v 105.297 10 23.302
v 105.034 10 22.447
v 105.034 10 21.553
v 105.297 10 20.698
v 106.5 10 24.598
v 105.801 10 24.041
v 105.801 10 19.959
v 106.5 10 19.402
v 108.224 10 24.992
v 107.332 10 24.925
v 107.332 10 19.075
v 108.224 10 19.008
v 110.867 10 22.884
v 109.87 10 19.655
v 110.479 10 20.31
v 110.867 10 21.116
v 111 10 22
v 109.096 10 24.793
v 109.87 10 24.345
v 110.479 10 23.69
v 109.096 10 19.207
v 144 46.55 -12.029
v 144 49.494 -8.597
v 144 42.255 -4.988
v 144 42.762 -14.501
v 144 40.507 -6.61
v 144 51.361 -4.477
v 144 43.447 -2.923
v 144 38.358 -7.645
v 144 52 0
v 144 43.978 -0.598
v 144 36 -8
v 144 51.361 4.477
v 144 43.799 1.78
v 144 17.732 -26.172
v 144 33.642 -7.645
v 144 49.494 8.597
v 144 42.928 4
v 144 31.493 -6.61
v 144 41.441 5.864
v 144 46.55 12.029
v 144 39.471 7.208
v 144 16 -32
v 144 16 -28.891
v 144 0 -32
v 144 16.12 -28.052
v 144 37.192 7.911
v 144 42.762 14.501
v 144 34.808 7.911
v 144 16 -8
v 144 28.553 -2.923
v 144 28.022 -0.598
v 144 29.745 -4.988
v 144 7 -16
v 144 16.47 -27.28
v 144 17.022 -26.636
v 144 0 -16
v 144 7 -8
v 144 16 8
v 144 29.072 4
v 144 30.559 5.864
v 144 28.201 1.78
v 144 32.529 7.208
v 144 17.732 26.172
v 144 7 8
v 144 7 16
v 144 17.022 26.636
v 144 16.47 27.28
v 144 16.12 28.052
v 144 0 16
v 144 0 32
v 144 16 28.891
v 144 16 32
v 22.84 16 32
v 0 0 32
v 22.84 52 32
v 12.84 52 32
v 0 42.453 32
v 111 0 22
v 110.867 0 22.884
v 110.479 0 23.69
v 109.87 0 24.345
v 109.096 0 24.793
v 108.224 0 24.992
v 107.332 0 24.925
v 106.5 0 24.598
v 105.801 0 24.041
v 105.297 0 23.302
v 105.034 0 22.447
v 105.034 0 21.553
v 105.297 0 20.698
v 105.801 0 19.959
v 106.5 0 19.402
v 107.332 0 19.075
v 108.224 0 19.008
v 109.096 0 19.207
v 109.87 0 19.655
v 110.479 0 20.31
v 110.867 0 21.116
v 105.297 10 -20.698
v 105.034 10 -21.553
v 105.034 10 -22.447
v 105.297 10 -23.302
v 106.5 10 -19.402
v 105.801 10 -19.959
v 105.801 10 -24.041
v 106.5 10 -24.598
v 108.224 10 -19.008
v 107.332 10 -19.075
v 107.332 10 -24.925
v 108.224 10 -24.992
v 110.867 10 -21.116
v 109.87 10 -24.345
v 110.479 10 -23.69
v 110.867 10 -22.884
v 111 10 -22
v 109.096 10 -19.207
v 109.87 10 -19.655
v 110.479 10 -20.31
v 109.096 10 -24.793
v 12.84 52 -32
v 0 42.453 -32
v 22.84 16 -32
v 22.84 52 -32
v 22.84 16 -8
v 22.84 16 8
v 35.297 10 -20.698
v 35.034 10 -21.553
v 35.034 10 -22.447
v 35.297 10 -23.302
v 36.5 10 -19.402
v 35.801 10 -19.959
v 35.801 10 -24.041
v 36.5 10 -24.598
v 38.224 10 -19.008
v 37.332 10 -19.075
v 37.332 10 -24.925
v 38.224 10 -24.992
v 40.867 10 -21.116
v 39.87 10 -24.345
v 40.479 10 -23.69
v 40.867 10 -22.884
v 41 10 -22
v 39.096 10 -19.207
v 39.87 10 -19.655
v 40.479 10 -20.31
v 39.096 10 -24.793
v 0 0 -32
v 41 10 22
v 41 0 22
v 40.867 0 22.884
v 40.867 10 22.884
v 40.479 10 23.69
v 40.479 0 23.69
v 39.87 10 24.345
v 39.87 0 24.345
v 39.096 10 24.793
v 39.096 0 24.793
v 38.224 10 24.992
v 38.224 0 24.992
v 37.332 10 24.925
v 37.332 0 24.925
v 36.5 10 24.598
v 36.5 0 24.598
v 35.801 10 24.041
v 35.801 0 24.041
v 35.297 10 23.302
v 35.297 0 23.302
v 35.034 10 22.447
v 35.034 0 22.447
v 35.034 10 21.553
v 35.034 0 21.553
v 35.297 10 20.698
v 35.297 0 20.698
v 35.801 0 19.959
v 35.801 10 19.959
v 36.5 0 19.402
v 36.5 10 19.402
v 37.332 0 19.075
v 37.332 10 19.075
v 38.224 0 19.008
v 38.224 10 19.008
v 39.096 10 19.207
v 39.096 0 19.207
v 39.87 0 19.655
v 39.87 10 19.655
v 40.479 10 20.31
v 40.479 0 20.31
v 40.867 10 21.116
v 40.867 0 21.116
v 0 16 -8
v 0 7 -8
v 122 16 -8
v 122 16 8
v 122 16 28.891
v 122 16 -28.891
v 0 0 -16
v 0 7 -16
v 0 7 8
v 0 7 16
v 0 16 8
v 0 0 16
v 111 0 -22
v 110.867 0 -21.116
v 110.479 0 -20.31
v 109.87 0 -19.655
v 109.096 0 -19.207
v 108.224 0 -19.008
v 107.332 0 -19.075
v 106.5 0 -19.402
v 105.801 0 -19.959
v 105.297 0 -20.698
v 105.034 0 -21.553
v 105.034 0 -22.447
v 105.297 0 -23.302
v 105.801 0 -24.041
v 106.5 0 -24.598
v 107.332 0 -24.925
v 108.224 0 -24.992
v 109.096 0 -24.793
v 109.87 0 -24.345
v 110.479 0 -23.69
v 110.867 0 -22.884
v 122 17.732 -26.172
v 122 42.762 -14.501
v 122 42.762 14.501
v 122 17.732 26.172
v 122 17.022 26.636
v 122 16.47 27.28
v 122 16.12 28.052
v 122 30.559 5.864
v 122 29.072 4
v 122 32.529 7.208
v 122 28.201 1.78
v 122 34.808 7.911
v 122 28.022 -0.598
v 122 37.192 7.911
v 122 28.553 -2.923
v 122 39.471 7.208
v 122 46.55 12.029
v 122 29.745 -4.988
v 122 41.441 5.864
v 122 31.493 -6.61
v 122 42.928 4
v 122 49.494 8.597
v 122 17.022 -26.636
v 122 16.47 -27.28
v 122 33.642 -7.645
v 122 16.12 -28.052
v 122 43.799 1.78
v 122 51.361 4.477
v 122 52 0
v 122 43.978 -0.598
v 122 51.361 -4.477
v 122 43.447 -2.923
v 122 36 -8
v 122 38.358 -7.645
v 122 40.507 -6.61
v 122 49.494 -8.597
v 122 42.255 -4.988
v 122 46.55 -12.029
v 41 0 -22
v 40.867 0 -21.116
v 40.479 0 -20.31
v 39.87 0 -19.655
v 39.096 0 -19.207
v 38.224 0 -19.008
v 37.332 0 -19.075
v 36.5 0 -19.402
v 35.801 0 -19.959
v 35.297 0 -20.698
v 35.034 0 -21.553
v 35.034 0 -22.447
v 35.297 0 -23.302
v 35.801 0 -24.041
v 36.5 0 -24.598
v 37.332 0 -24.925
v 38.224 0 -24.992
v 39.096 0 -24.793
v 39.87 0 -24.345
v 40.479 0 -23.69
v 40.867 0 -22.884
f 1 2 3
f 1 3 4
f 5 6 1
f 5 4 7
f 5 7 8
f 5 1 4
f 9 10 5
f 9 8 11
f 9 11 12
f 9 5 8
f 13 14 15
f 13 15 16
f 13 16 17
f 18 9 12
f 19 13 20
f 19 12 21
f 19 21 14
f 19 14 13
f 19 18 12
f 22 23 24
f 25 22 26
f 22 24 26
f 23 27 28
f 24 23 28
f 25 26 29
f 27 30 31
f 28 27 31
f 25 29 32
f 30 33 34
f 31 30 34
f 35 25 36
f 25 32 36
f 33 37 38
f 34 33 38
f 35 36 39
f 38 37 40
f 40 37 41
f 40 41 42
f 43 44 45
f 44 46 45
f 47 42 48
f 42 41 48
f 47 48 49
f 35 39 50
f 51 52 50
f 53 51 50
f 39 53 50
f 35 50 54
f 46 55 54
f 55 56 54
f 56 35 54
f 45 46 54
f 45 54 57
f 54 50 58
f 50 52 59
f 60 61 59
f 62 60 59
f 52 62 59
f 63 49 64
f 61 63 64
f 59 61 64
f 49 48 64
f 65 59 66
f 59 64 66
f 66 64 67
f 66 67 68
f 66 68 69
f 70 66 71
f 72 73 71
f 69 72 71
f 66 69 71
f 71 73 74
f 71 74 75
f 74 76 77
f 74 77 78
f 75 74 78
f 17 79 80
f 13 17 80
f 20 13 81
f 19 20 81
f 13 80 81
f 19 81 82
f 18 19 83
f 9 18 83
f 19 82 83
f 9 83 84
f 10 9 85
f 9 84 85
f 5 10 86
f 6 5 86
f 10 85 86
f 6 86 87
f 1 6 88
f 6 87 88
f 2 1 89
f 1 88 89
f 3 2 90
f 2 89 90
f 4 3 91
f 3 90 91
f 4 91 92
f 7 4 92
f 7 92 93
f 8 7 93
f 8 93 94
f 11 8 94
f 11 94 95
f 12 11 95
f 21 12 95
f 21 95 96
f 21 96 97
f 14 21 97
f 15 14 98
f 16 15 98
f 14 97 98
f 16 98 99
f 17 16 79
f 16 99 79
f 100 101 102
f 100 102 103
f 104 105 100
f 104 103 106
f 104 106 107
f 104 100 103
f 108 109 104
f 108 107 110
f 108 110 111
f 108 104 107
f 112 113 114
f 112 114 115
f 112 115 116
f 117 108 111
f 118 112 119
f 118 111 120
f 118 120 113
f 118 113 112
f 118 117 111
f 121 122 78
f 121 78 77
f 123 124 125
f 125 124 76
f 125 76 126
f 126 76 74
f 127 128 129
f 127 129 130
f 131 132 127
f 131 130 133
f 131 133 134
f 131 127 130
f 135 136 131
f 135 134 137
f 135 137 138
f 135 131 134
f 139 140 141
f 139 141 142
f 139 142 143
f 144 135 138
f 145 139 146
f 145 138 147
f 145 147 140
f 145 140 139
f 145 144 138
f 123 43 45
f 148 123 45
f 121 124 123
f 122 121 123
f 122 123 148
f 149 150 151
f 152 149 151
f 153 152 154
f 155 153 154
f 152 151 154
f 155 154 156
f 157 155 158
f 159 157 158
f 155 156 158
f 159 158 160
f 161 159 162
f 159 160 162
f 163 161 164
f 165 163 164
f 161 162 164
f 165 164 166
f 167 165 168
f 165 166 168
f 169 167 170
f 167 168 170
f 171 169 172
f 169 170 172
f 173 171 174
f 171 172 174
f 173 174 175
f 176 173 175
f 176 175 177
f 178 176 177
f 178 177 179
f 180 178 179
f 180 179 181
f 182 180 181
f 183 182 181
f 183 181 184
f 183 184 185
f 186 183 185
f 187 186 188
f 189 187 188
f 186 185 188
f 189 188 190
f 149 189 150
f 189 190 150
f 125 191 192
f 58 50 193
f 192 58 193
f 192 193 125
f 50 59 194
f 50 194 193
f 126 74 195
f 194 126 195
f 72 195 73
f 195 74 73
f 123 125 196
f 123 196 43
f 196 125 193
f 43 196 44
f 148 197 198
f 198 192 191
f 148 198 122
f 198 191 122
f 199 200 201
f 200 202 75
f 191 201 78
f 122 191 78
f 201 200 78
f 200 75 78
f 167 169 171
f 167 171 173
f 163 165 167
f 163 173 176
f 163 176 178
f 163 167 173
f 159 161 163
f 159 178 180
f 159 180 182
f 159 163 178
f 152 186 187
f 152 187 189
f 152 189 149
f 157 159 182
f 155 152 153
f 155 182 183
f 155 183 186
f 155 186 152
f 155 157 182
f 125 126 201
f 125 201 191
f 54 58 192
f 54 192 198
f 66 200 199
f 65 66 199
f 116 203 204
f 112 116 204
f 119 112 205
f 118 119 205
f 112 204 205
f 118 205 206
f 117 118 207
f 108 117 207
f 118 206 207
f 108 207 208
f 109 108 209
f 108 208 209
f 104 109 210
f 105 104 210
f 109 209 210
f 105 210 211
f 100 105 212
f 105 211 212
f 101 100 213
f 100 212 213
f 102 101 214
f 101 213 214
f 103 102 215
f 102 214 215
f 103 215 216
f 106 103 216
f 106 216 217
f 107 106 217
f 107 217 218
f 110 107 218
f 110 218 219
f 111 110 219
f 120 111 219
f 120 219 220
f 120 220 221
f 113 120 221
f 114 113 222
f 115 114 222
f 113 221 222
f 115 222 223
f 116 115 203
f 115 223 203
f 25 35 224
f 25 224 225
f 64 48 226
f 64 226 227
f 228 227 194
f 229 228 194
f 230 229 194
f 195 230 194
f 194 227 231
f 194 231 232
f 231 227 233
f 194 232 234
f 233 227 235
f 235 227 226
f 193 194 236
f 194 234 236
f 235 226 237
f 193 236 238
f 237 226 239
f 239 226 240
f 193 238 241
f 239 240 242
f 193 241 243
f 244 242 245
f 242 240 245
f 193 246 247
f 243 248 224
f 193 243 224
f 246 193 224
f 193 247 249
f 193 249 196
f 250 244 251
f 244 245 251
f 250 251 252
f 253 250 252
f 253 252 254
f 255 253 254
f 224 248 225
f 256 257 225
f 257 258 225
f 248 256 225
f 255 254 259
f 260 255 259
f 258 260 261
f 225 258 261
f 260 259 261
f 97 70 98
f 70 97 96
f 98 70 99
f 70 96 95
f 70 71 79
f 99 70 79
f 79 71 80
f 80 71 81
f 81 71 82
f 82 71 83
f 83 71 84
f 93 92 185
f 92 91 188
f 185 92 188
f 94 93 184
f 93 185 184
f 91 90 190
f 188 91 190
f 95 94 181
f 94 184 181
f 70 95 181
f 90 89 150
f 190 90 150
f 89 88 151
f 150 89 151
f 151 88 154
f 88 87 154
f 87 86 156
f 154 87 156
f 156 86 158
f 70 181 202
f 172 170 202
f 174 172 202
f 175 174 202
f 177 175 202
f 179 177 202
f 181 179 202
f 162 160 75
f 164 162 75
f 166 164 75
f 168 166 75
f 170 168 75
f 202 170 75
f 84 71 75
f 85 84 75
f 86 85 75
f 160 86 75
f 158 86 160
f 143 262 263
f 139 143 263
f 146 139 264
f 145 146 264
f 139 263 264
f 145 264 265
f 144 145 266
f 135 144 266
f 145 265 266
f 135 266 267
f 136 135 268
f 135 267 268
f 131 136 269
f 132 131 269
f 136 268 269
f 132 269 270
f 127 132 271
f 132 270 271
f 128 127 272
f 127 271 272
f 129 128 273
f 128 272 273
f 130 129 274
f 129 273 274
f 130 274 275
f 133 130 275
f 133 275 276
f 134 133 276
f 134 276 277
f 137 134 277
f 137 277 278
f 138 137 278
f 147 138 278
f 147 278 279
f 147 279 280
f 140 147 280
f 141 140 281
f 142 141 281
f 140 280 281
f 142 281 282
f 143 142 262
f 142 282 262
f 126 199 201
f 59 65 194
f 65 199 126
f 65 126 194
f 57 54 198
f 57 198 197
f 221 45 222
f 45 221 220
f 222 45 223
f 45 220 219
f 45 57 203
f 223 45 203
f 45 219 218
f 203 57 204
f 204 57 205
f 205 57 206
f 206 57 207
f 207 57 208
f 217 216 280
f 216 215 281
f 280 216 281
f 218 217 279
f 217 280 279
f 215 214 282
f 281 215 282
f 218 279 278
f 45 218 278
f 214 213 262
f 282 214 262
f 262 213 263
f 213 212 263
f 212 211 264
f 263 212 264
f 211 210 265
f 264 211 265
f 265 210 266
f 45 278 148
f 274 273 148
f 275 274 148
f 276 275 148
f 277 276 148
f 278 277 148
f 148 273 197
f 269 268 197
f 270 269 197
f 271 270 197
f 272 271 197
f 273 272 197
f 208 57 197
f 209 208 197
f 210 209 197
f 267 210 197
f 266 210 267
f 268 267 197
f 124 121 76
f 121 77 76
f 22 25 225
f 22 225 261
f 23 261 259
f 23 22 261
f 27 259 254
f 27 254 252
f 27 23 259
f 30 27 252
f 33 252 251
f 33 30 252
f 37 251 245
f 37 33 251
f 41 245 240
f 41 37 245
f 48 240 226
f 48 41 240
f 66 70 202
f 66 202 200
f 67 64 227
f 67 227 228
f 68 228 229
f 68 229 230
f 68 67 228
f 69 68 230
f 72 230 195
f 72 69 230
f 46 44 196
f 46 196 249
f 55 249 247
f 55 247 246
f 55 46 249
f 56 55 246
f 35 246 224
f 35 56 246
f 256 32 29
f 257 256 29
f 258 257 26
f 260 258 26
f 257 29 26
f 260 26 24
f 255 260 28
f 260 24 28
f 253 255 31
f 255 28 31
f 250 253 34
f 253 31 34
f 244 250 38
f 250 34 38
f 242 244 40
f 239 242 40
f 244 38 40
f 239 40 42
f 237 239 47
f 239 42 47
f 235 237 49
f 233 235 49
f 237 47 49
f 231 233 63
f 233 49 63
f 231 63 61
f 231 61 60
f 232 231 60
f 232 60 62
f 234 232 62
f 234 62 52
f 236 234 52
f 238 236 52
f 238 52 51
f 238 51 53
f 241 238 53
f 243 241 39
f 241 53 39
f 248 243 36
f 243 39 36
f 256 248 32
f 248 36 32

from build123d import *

# Parameters (mm, degrees)
BOSS_EXTRUDE1_DEPTH  = 32
SKETCH5_R            = 16
SKETCH5_R_2          = 8
BOSS_EXTRUDE2_DEPTH  = 22
CUT_EXTRUDE1_REACH   = 146
SKETCH9_R            = 3
CUT_EXTRUDE2_DEPTH   = 10
LPATTERN1_COUNT      = 2
LPATTERN1_PITCH      = 70
LPATTERN1_COUNT_DIR2 = 2
LPATTERN1_PITCH_DIR2 = 44


with BuildPart() as part:
    # Sketch3 → Boss-Extrude1 (new body, symmetric)
    with BuildSketch(Plane.XY):
        Polygon((0, 0), (0, 42.452913403), (12.839514692, 52), (22.839514692, 52), (22.839514692, 16), (144, 16), (144, 0), align=None)
    extrude(amount=BOSS_EXTRUDE1_DEPTH, both=True)

    # Sketch5 → Boss-Extrude2 (add)
    with BuildSketch(Plane(origin=(144, 0, 0), x_dir=(0, 0, -1), z_dir=(1, 0, 0))):
        with Locations((0, 36)):
            Circle(SKETCH5_R)
        with Locations((0, 36)):
            Circle(SKETCH5_R_2, mode=Mode.SUBTRACT)
        with BuildLine():
            ThreePointArc((16, 36), (-3.463033823, 20.379263886), (-14.500924593, 42.761892188))
            Line((-14.500924593, 42.761892188), (-26.172487288, 17.732145215))
            ThreePointArc((-26.172487288, 17.732145215), (-27.279511824, 16.469825663), (-28.891410649, 16))
            Line((-28.891410649, 16), (28.891410649, 16))
            ThreePointArc((28.891410649, 16), (27.279511824, 16.469825663), (26.172487288, 17.732145215))
            Line((26.172487288, 17.732145215), (14.500924593, 42.761892188))
            ThreePointArc((14.500924593, 42.761892188), (15.620736114, 39.463033823), (16, 36))
        make_face()
    extrude(amount=-BOSS_EXTRUDE2_DEPTH)

    # Sketch8 → Cut-Extrude1 (cut, up to next)
    with BuildSketch(Plane(origin=(144, 0, 0), x_dir=(0, 0, -1), z_dir=(1, 0, 0)), mode=Mode.PRIVATE) as cut_extrude1_sk1:
        Polygon((-16, 0), (-16, 7), (-8, 7), (-8, 16), (8, 16), (8, 7), (16, 7), (16, 0), align=None)
    cut_extrude1_tool1 = extrude(cut_extrude1_sk1.sketch, amount=-CUT_EXTRUDE1_REACH, mode=Mode.PRIVATE) & part.part
    add(cut_extrude1_tool1.solids().sort_by_distance((144, 6.630435, 0))[0], mode=Mode.SUBTRACT)

    # Sketch9 → Cut-Extrude2 (cut)
    with BuildSketch(Plane.XZ):
        with Locations((38, 22)):
            Circle(SKETCH9_R)
    cut_extrude2 = extrude(amount=-CUT_EXTRUDE2_DEPTH, mode=Mode.SUBTRACT)

    # LPattern1: Cut-Extrude2 2 × 2
    with Locations(*[(i * LPATTERN1_PITCH, 0, -j * LPATTERN1_PITCH_DIR2) for i in range(LPATTERN1_COUNT) for j in range(LPATTERN1_COUNT_DIR2) if (i, j) != (0, 0)]):
        add(cut_extrude2, mode=Mode.SUBTRACT)


solid = part.part
